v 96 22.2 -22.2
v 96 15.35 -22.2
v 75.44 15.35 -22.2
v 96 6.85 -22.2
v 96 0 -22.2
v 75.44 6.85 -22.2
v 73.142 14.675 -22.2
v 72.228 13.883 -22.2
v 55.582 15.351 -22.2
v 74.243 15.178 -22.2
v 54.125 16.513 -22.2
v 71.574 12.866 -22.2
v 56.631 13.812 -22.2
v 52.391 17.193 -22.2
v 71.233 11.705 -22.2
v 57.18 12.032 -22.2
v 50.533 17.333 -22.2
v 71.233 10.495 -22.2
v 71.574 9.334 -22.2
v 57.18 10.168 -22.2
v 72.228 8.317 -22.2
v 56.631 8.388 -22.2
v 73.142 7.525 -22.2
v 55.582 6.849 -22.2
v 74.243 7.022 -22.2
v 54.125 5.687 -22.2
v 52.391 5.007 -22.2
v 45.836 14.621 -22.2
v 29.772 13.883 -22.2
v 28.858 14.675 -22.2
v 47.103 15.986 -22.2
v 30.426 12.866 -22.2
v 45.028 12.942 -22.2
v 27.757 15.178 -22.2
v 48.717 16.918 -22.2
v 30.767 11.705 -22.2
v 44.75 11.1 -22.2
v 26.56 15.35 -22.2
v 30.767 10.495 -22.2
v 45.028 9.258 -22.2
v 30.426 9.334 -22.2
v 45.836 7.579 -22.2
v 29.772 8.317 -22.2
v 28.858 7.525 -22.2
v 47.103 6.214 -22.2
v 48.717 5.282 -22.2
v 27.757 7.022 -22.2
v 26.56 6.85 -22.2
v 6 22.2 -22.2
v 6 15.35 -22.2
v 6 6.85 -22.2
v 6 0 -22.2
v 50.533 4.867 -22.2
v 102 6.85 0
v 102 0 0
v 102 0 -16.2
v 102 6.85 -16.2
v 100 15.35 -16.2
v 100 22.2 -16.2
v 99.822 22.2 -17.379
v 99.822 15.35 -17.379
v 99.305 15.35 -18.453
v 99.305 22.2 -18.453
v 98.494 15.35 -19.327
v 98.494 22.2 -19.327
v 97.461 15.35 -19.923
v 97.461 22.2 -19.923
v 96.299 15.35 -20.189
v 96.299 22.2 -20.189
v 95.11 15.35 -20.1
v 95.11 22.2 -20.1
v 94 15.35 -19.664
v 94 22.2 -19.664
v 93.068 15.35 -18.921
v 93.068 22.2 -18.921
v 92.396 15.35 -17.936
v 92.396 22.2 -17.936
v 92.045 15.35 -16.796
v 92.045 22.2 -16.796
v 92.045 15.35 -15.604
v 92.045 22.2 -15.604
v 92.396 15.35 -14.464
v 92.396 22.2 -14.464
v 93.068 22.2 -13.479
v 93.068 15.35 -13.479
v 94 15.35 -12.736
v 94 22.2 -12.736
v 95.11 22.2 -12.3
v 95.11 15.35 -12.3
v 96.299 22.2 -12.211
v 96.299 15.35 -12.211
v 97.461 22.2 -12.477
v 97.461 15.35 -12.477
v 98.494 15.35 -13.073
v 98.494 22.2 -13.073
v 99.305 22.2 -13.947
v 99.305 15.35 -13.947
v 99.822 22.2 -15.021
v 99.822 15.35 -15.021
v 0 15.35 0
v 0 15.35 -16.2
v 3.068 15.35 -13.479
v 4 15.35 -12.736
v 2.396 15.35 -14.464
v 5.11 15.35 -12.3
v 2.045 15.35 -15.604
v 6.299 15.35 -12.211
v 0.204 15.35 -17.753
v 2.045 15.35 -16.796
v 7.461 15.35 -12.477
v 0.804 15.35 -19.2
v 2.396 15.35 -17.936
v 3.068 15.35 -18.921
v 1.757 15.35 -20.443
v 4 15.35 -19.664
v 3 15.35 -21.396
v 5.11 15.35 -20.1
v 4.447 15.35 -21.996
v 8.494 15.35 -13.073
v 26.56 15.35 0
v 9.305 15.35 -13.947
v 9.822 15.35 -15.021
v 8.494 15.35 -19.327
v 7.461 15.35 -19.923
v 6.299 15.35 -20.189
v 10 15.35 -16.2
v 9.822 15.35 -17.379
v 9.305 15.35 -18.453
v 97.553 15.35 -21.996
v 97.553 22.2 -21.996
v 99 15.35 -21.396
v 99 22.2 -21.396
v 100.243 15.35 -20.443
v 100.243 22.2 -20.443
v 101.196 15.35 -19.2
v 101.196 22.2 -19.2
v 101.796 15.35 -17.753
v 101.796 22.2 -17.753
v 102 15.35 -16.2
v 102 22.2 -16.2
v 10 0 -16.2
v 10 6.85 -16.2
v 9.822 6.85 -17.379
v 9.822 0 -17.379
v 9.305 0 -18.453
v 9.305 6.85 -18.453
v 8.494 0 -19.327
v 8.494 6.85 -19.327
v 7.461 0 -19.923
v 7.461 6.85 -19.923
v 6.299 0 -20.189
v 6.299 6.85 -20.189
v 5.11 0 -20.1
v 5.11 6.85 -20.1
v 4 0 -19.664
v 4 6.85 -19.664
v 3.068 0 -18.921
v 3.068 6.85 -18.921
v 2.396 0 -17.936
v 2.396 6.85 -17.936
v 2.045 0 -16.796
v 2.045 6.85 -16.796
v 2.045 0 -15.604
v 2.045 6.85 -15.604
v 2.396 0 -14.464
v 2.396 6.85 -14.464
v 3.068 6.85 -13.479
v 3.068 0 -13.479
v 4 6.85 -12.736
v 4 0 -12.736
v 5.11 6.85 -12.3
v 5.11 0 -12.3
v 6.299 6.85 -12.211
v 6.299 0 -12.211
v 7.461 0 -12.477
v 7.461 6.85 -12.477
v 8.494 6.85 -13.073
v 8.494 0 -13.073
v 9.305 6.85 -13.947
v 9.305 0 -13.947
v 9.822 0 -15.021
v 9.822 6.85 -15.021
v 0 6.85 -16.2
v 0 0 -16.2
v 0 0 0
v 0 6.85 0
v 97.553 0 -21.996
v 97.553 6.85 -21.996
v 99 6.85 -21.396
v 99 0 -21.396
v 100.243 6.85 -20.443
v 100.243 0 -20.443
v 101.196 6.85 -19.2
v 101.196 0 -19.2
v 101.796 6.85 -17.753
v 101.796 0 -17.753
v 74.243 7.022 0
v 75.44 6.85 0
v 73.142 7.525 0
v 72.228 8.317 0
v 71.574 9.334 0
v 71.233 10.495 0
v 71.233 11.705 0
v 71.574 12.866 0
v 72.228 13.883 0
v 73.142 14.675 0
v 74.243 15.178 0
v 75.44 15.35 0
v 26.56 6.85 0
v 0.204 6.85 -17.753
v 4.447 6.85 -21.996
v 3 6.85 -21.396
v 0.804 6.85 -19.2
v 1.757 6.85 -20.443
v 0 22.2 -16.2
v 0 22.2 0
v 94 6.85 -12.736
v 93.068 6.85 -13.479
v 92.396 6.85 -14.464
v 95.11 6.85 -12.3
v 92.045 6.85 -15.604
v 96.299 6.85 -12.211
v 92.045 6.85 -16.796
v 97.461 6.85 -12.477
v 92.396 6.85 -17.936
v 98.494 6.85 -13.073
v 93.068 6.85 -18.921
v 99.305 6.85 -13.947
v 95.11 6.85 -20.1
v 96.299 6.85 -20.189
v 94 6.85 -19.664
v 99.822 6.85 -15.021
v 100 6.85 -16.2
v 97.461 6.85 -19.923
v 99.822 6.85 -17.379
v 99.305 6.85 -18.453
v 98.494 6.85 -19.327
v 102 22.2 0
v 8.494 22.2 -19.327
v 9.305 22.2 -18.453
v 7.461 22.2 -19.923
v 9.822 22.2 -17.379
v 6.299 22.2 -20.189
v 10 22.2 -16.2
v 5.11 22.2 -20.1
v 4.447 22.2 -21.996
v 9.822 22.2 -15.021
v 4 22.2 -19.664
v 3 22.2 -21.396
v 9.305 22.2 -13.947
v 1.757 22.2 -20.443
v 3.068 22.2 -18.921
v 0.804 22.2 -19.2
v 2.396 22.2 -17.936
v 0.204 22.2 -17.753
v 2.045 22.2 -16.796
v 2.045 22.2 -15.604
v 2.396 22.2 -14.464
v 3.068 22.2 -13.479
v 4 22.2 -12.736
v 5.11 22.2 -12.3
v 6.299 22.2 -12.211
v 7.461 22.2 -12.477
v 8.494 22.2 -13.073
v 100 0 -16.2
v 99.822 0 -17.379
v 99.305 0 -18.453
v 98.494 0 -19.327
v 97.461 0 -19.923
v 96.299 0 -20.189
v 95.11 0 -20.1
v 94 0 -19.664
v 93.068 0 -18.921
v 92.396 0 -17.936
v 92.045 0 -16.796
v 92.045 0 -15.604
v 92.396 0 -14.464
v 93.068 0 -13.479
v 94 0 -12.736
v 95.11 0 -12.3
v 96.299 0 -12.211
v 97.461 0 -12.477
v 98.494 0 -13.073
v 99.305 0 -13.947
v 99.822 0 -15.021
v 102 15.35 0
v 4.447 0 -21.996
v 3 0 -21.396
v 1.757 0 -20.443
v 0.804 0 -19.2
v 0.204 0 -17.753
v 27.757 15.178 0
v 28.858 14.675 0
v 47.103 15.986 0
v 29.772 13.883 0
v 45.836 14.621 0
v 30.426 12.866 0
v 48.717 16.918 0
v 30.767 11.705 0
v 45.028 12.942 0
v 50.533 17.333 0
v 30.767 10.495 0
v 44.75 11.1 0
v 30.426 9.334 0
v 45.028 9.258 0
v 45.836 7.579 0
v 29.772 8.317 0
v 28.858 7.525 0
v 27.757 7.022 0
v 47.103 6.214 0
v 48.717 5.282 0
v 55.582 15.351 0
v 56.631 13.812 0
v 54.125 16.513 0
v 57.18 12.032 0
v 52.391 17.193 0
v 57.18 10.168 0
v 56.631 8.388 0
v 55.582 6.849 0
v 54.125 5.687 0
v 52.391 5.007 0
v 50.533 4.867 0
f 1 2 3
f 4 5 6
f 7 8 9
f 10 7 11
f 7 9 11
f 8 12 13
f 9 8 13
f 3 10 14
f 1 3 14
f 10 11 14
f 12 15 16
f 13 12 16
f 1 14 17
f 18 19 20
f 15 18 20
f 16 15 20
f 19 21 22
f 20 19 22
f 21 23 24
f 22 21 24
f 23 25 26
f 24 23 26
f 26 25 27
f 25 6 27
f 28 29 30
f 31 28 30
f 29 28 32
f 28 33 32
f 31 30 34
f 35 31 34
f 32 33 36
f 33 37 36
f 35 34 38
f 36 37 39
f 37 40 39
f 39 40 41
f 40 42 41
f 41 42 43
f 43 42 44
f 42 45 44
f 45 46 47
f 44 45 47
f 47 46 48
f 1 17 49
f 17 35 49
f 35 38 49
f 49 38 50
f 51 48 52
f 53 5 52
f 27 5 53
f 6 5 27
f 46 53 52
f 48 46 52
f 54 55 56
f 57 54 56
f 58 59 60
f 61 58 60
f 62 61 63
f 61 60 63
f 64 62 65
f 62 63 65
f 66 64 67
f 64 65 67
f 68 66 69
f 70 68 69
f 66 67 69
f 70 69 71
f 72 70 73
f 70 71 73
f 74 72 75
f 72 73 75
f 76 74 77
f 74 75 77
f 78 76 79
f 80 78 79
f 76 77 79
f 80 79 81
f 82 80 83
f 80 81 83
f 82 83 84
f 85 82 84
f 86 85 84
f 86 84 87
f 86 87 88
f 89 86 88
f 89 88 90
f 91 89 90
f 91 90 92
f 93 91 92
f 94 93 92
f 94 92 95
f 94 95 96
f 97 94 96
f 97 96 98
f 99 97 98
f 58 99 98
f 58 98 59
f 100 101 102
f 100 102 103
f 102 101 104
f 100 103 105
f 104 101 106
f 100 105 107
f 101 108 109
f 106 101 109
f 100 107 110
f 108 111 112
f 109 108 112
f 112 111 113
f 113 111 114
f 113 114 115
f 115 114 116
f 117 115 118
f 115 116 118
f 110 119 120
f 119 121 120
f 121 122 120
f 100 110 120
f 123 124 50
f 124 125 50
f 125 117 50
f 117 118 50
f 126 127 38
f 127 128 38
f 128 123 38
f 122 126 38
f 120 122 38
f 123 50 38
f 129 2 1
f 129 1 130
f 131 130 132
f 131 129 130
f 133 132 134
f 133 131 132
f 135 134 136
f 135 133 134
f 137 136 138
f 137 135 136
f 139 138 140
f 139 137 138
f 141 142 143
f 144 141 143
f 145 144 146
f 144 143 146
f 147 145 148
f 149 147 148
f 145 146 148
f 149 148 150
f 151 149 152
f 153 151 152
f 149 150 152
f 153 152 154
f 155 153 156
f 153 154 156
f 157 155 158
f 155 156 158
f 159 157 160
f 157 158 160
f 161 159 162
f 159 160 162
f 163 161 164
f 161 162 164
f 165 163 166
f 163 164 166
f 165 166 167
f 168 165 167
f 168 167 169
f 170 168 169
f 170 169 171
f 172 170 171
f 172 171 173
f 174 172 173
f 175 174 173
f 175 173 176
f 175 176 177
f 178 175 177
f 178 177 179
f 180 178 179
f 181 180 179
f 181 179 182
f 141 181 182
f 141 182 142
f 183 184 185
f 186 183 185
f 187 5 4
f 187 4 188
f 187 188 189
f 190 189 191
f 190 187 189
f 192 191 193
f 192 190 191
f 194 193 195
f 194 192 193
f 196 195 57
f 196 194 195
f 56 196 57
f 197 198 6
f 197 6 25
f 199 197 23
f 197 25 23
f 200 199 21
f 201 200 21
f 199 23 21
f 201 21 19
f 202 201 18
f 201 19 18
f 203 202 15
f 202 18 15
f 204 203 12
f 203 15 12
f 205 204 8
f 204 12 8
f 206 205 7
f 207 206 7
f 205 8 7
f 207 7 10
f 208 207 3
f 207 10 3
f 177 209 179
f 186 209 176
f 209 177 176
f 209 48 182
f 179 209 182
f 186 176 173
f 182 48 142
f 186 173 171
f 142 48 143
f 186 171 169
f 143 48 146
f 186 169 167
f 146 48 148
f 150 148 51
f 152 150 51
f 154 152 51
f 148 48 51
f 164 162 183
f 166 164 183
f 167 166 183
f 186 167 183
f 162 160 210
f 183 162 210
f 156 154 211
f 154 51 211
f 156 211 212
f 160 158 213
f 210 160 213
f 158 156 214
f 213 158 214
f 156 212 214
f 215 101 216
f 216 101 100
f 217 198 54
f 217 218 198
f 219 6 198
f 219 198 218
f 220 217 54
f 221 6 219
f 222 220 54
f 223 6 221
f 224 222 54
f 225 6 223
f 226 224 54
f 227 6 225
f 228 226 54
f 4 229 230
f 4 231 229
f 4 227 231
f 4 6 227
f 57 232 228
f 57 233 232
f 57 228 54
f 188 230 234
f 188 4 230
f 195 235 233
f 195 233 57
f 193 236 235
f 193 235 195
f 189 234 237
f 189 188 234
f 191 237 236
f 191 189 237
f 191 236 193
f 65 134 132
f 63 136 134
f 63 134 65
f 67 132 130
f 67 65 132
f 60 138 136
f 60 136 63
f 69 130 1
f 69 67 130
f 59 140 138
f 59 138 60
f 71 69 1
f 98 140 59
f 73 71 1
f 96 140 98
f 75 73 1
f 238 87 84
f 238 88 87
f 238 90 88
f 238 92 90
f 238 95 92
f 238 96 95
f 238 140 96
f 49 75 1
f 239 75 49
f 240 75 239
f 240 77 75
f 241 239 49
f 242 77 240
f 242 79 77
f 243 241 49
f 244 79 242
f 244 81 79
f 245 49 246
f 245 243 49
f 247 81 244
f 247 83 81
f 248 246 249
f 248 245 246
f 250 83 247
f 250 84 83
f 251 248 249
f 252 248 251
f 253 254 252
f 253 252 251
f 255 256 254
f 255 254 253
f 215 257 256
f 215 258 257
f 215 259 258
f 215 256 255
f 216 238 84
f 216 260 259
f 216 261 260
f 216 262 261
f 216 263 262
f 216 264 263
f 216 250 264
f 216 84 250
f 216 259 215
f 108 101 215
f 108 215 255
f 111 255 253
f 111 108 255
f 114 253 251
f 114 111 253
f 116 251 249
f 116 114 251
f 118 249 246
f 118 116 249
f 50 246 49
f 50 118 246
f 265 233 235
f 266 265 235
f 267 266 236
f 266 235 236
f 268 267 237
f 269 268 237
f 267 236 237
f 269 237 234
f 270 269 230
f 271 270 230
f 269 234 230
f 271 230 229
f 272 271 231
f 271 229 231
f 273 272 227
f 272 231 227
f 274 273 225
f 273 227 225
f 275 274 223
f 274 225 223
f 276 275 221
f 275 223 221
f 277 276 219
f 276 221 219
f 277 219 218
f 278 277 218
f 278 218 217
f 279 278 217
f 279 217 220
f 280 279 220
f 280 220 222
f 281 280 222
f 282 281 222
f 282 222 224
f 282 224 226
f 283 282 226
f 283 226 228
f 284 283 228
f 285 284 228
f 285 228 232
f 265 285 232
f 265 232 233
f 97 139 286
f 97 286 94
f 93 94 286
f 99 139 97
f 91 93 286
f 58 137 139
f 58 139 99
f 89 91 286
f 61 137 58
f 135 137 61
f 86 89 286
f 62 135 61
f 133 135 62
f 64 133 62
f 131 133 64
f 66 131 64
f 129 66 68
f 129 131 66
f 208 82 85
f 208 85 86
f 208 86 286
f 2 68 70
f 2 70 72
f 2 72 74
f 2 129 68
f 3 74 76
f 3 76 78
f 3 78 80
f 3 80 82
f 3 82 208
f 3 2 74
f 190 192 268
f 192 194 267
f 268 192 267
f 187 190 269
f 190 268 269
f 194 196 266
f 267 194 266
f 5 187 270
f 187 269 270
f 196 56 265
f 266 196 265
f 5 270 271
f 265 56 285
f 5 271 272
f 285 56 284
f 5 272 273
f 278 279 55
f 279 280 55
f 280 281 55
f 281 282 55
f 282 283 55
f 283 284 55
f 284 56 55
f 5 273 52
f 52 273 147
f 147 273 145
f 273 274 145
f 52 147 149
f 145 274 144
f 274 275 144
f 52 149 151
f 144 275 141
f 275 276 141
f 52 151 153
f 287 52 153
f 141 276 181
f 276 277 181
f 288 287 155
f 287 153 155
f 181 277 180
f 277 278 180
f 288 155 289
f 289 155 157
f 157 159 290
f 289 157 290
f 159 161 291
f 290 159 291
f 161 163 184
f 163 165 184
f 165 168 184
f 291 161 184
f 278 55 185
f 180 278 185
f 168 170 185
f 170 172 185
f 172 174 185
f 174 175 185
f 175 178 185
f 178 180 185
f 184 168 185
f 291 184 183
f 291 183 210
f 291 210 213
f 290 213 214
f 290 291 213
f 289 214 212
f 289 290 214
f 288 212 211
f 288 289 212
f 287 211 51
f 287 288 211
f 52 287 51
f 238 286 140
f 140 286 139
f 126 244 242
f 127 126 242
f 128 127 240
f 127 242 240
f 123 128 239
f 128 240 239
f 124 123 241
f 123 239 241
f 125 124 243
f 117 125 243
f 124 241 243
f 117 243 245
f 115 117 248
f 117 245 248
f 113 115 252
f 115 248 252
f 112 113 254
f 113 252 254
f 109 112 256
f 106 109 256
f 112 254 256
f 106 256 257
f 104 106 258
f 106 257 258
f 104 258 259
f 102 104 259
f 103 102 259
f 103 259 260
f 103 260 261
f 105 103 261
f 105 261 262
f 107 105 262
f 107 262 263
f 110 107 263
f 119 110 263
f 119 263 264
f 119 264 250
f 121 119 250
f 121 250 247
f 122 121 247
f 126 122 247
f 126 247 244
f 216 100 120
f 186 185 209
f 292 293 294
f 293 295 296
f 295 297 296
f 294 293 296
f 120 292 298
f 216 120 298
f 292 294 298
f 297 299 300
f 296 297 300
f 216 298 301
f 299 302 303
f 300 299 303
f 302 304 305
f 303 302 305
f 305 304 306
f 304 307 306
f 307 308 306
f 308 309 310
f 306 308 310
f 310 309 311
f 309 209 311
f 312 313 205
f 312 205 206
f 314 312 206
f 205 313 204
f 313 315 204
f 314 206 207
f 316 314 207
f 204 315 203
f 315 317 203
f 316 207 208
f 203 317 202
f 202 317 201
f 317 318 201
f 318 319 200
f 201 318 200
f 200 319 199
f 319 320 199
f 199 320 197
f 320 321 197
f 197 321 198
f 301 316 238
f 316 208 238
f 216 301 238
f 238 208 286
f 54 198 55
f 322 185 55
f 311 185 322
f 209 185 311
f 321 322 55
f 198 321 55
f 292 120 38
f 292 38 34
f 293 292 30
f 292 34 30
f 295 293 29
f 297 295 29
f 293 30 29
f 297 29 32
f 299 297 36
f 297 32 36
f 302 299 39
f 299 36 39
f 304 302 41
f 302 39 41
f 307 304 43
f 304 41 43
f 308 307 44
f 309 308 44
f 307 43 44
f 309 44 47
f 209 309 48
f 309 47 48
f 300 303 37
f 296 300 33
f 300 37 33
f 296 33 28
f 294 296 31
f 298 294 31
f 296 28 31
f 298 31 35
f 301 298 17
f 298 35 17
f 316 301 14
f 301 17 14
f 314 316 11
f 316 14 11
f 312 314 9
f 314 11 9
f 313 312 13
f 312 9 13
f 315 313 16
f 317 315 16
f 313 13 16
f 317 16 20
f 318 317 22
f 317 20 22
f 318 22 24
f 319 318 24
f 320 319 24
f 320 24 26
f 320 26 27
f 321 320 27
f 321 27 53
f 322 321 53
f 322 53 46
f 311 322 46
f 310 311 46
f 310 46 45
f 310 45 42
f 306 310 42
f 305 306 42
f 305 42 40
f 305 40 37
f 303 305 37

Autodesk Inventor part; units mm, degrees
ref_plane "YZ Plane" through (0, 0, 0) normal (1, 0, 0) x (0, 1, 0)
ref_plane "XZ Plane" through (0, 0, 0) normal (0, 1, 0) x (-1, 0, 0)
ref_plane "XY Plane" through (0, 0, 0) normal (0, 0, 1) x (1, 0, 0)
sketch "Boceto1" plane through (0, 0, 0) normal (0, 1, 0) x (-1, 0, 0)
  line L0 (0, 0) -> (-102, 0)
  line L1 (-102, 0) -> (-102, -16.2)
  line L2 (-96, -22.2) -> (-6, -22.2)
  line L3 (0, -16.2) -> (0, 0)
  arc A0 (-102, -16.2) -> (-96, -22.2) centre (-96, -16.2) ccw
  arc A1 (-6, -22.2) -> (0, -16.2) centre (-6, -16.2) ccw
  line L4 (0, 0) -> (-51, 0) construction
  line L5 (-51, 0) -> (-51, -11.1) construction
  circle A2 centre (-6, -16.2) radius 4
  circle A3 centre (-96, -16.2) radius 4
  dimension "d0" = 6
  dimension "d1" = 102
  dimension "d2" = 22.2
  dimension "d3" = 51
  dimension "d4" = 11.1
  dimension "d5" = 8
  dimension "d6" = 8
extrude "Extrusión1" add sketch "Boceto1" along normal blind 22.2 contours L3 A1 L2 A0 L1 L0 | A2 | A3
sketch "Boceto2" plane through (0, 22.2, 0) normal (0, 1, 0) x (1, 0, 0)
  arc A0 (6, 22.2) -> (0, 16.2) centre (6, 16.2) ccw projected
  circle A1 centre (6, 16.2) radius 4
  arc A2 (102, 16.2) -> (96, 22.2) centre (96, 16.2) ccw projected
  circle A3 centre (96, 16.2) radius 4
  point P0 (0, 0)
  dimension "d9" = 8
  dimension "d10" = 8
extrude "Extrusión2" cut sketch "Boceto2" against normal through all
sketch "Boceto3" plane through (96, 0, -22.2) normal (0, 0, -1) x (-1, 0, 0)
  line L0 (-6, 0) -> (-6, 22.2) projected
  line L1 (96, 0) -> (96, 22.2) projected
  line L2 (0, 0) -> (90, 0) projected
  line L3 (0, 22.2) -> (90, 22.2) projected
  line L4 (96, 22.2) -> (90, 22.2) projected
  line L5 (96, 0) -> (90, 0) projected
  line L6 (0, 0) -> (-6, 0) projected
  line L7 (0, 22.2) -> (-6, 22.2) projected
  line L8 (-6, 0) -> (45, 0) construction
  line L9 (45, 0) -> (45, 11.1) construction
  arc A0 (69.44, 15.35) -> (69.44, 6.85) centre (69.44, 11.1) ccw
  line L10 (69.44, 6.85) -> (96, 6.85)
  line L11 (96, 15.35) -> (69.44, 15.35)
  arc A1 (20.56, 6.85) -> (20.56, 15.35) centre (20.56, 11.1) ccw
  line L12 (20.56, 6.85) -> (-6, 6.85)
  line L13 (-6, 15.35) -> (20.56, 15.35)
  circle A2 centre (45, 11.1) radius 6.25
  dimension "d13" = 51
  dimension "d14" = 11.1
  dimension "d15" = 8.5
  dimension "d16" = 26.56
  dimension "d17" = 12.5
extrude "Extrusión3" cut sketch "Boceto3" against normal through all contours L0 L13 A1 L12 | L10 A0 L11 L1 | A2
equation "\"Radio_pliegue\" = Grosor"
equation "\"Anchura_desahogo_plegado\" = Grosor"
equation "\"Profundidad_desahogo_plegado\" = 0.5 * Grosor"
equation "\"Tamaño_destalonado\" = 4 * Grosor"
equation "\"Remanente_mínimo\" = 2 * Grosor"
equation "\"Radiodetransición\" = Radio_pliegue"
equation "\"Tamaño_de_radio_de_Jacobi\" = Radio_pliegue"
equation "\"TamañoSeparación\" = Grosor"
equation "\"Grosor\" = 0.5"
properties part number "Practica 7" material "Hierro, gris"
